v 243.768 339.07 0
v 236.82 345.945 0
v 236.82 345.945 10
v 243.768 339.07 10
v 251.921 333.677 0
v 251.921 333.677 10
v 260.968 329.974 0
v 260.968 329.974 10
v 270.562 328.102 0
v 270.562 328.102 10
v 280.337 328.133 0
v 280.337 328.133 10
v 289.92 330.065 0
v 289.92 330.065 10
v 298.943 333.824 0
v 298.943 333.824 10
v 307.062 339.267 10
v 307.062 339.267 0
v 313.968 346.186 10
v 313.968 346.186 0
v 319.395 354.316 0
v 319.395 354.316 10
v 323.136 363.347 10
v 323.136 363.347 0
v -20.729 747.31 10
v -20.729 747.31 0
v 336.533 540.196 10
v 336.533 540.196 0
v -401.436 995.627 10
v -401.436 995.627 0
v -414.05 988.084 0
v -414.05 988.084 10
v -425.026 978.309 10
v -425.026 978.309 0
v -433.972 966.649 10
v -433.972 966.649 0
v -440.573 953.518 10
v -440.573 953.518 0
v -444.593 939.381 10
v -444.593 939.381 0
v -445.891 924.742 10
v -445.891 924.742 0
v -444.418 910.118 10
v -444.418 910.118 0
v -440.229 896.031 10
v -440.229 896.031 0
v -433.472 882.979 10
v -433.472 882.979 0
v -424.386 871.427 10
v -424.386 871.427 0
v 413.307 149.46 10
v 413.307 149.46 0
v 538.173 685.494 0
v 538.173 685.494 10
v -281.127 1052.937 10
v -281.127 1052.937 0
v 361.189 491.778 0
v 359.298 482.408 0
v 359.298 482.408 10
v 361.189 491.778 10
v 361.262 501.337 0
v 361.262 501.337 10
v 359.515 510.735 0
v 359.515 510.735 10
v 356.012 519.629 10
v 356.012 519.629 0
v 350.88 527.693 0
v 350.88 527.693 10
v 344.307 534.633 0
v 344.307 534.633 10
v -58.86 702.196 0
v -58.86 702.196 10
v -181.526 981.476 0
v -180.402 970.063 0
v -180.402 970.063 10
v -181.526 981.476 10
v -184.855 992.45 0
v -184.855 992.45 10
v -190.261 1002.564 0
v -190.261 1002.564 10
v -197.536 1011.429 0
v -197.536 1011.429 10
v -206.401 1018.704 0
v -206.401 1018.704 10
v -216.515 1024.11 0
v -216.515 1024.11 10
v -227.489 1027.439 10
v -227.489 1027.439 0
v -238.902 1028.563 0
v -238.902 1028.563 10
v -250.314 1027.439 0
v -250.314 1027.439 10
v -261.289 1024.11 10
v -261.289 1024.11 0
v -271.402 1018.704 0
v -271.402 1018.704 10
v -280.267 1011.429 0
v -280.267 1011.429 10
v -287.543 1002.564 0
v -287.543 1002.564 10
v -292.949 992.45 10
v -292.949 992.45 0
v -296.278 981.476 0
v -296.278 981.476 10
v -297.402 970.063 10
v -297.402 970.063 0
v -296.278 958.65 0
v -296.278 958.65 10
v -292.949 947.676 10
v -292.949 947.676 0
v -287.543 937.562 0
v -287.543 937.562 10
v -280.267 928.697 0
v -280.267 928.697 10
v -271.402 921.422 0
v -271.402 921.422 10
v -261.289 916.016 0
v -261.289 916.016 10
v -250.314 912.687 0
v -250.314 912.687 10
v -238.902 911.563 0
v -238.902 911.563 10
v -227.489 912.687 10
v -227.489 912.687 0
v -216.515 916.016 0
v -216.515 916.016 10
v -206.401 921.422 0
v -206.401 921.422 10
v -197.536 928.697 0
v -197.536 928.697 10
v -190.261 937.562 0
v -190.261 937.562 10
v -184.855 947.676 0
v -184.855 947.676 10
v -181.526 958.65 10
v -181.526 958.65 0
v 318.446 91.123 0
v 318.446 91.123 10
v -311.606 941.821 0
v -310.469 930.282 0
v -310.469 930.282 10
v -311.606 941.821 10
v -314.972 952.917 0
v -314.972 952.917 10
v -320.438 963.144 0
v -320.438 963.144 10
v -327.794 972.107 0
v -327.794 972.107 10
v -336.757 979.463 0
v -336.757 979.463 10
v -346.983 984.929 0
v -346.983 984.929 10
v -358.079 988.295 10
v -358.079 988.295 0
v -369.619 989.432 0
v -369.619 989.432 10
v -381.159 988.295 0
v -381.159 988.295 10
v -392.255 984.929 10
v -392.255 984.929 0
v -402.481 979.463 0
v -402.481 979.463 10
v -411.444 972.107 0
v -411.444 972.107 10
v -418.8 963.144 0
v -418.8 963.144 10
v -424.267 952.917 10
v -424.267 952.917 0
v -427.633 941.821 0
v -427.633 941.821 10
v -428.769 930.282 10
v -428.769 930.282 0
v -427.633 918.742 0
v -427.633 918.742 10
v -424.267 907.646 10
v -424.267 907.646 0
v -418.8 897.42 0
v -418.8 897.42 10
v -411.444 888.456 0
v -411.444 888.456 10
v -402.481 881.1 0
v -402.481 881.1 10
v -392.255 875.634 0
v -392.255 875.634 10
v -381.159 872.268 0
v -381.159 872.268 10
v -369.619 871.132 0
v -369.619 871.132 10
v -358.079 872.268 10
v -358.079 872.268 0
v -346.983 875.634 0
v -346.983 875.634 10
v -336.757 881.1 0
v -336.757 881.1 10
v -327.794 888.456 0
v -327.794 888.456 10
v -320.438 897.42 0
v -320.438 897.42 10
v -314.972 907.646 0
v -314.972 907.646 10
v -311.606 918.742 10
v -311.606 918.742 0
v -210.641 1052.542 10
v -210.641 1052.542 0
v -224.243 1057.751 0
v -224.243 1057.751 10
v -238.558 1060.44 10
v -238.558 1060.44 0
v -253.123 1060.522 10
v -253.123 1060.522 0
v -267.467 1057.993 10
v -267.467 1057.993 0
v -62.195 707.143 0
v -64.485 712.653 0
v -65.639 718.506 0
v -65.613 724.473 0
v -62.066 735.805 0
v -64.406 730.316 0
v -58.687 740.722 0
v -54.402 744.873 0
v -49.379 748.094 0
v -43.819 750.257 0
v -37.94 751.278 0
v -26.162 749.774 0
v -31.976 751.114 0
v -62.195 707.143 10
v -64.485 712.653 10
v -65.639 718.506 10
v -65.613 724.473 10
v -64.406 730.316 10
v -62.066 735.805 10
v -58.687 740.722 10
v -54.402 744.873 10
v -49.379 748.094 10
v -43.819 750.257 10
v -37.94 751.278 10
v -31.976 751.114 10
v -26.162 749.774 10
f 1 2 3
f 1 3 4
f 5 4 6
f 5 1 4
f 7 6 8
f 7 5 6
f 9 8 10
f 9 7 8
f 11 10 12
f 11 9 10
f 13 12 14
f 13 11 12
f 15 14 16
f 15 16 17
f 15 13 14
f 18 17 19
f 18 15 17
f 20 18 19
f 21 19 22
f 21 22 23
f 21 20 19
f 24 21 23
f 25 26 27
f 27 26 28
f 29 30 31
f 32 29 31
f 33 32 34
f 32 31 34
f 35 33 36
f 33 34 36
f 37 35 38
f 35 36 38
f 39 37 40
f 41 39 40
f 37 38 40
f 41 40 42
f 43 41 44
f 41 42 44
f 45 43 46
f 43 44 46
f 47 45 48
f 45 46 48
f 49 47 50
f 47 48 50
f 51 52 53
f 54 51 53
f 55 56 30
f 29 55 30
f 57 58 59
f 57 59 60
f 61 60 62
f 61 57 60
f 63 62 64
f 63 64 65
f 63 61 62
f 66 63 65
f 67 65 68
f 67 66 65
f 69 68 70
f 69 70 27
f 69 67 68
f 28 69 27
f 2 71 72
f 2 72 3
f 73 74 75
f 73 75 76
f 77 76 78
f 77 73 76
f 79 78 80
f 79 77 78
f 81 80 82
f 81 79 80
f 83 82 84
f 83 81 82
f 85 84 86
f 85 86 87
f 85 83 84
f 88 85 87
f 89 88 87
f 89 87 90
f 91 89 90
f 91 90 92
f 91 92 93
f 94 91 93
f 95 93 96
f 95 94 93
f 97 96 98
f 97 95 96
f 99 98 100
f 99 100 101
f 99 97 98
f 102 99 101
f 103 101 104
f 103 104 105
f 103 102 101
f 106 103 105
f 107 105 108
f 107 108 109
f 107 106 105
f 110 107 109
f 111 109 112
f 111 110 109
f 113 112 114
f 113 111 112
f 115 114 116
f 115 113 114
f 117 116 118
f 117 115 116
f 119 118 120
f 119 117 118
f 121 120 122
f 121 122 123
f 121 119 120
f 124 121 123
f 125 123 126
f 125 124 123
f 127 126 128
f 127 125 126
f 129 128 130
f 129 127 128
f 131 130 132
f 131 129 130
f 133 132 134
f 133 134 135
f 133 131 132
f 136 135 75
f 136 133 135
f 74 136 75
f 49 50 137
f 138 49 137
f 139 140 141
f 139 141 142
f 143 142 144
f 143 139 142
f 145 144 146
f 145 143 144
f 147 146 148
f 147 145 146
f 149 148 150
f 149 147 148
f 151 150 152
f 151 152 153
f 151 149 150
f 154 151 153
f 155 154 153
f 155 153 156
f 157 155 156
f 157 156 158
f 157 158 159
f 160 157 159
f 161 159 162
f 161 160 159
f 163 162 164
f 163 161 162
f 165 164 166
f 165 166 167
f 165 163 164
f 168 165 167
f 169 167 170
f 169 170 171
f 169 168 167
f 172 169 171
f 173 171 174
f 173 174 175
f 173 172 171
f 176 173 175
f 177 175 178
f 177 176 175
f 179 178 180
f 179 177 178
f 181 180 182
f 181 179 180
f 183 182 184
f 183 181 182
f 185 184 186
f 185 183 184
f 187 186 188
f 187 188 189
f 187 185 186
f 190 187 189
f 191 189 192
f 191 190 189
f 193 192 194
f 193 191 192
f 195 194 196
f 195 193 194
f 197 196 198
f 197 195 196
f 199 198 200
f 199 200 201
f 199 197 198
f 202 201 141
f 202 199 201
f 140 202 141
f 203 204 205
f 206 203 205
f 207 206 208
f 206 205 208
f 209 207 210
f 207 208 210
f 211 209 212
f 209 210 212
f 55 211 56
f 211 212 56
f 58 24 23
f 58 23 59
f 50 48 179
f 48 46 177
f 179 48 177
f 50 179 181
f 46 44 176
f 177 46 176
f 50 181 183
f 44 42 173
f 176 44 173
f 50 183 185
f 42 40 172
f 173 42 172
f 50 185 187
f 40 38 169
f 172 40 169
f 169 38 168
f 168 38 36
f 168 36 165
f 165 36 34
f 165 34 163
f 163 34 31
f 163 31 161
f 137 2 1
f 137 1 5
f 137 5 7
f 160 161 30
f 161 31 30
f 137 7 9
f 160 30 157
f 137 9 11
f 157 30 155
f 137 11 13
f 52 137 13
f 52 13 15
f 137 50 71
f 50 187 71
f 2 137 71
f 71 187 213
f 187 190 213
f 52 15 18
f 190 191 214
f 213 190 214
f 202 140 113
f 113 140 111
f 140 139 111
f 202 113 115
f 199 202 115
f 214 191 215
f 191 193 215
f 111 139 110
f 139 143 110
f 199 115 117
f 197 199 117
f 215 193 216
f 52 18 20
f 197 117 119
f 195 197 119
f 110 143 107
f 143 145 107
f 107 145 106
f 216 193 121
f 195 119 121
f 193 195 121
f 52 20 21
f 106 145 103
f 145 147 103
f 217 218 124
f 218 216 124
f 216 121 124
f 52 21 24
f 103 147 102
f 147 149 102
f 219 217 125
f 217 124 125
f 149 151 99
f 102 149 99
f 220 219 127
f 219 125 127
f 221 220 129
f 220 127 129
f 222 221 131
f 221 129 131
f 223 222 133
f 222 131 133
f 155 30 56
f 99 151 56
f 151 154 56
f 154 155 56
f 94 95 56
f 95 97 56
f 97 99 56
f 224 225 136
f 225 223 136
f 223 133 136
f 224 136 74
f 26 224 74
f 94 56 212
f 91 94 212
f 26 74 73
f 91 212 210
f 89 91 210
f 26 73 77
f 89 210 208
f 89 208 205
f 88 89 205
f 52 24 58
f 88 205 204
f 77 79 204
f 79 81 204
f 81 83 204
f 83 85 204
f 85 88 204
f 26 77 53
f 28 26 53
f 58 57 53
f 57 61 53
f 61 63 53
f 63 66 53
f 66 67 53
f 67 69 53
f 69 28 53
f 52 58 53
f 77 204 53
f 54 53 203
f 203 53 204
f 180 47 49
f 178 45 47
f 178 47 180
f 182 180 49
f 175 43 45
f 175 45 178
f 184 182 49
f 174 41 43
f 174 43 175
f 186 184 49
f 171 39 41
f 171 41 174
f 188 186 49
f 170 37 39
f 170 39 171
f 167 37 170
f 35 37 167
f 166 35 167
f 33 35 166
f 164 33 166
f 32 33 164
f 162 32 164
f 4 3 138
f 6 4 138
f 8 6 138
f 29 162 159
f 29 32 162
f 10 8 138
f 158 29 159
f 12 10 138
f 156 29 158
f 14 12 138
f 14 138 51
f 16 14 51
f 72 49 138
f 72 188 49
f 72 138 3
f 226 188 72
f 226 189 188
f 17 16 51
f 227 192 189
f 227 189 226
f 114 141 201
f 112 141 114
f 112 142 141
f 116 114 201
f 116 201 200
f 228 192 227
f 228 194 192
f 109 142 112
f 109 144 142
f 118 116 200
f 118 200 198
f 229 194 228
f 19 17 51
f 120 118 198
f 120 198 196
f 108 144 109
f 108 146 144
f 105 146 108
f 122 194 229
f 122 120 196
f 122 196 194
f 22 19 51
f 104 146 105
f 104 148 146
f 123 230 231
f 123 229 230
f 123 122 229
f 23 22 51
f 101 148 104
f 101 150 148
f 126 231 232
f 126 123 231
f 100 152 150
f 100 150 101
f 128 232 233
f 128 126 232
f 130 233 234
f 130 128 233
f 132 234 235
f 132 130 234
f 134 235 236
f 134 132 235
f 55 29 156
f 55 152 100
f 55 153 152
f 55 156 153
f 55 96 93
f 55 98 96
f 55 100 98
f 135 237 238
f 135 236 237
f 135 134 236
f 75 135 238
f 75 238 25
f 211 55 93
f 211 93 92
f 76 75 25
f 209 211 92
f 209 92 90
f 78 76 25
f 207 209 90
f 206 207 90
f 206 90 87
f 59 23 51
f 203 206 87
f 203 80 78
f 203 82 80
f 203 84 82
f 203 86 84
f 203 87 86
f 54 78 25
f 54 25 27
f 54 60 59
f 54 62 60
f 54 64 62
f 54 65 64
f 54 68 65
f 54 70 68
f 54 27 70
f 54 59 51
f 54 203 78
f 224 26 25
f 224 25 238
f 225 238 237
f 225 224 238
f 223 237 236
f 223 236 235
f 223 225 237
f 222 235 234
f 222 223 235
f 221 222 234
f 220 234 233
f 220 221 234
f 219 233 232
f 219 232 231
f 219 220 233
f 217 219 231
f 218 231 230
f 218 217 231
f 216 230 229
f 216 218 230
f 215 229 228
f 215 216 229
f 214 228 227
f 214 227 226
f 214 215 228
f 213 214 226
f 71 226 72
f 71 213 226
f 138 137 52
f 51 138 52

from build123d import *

# Parameters (mm, degrees)
SKETCH_R   = 58.5
SKETCH_R_2 = 59.15
PAD_DEPTH  = 10


with BuildPart() as part:
    # Sketch → Pad (new body)
    with BuildSketch(Plane.XY):
        with BuildLine():
            Line((-424.386055, 871.427134), (318.446365, 91.122677))
            Line((318.446365, 91.122677), (413.307384, 149.460342))
            Line((413.307384, 149.460342), (538.173226, 685.49367))
            Line((538.173226, 685.49367), (-210.640671, 1052.542483))
            ThreePointArc((-210.640671, 1052.542483), (-245.83847, 1060.808988), (-281.126647, 1052.937227))
            Line((-281.126647, 1052.937227), (-401.436309, 995.626851))
            ThreePointArc((-401.436309, 995.626851), (-444.593461, 939.381275), (-424.386055, 871.427134))
        make_face()
        with Locations((-238.901588, 970.063171)):
            Circle(SKETCH_R, mode=Mode.SUBTRACT)
        with Locations((-369.619069, 930.28155)):
            Circle(SKETCH_R_2, mode=Mode.SUBTRACT)
        with BuildLine():
            ThreePointArc((-20.728661, 747.309936), (-58.68704, 740.721675), (-58.859603, 702.196177))
            Line((-58.859603, 702.196177), (236.819684, 345.945149))
            ThreePointArc((236.819684, 345.945149), (285.175775, 328.864216), (323.136202, 363.347195))
            Line((323.136202, 363.347195), (359.298187, 482.408455))
            ThreePointArc((359.298187, 482.408455), (357.97659, 515.265634), (336.53324, 540.196008))
            Line((-20.728661, 747.309936), (336.53324, 540.196008))
        make_face(mode=Mode.SUBTRACT)
    extrude(amount=PAD_DEPTH)


solid = part.part
